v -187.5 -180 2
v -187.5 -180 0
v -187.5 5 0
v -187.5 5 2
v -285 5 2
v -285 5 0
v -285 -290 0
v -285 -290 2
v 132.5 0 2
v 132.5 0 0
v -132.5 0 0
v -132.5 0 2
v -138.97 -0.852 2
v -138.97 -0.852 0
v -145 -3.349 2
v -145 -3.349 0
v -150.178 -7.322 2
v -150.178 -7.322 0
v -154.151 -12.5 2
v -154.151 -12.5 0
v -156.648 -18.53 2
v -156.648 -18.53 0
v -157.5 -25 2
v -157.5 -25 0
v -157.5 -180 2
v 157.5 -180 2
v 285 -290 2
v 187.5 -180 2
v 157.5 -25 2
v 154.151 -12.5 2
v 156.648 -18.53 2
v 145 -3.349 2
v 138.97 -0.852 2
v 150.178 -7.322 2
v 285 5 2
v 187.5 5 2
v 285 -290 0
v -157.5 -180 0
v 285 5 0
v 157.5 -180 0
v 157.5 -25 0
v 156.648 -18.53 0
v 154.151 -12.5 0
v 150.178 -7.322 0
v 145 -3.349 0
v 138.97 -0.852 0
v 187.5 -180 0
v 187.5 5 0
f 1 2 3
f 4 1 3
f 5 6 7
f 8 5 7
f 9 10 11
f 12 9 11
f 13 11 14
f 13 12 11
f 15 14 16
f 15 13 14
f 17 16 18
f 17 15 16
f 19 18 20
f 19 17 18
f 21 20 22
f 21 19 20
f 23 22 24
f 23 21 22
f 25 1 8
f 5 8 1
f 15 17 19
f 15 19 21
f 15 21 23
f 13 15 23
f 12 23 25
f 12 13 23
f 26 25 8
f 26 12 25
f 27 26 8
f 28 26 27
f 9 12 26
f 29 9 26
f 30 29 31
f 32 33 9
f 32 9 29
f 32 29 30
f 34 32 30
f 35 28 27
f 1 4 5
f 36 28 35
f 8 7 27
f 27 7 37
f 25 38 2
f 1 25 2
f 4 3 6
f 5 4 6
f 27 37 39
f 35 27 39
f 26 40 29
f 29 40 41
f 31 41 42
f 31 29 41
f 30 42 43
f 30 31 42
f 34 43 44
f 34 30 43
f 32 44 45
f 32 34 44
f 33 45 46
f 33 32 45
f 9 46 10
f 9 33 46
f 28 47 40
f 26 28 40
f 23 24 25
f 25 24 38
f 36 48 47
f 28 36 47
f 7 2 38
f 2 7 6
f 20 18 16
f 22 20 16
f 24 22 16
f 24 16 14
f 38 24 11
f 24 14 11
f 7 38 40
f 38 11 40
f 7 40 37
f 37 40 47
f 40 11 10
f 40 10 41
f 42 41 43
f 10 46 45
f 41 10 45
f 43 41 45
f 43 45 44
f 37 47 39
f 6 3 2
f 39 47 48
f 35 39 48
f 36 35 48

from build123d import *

# Parameters (mm, degrees)
F1_DEPTH = 2
F2_R     = 25


with BuildPart() as f1:
    # F0 (on Top) → F1 (new body)
    with BuildSketch(Plane.XY):
        Polygon((-285, -290), (285, -290), (285, 0), (285, 5), (187.5, 5), (187.5, 0), (187.5, -180), (157.5, -180), (157.5, 0), (-157.5, 0), (-157.5, -180), (-187.5, -180), (-187.5, 0), (-187.5, 5), (-285, 5), (-285, 0), align=None)
    extrude(amount=F1_DEPTH)

    # F2
    f2_edges = [f1.edges().sort_by_distance(p)[0] for p in [
        (-157.5, 0, 1),
        (157.5, 0, 1),
    ]]
    fillet(f2_edges, radius=F2_R)


solid = f1.part
